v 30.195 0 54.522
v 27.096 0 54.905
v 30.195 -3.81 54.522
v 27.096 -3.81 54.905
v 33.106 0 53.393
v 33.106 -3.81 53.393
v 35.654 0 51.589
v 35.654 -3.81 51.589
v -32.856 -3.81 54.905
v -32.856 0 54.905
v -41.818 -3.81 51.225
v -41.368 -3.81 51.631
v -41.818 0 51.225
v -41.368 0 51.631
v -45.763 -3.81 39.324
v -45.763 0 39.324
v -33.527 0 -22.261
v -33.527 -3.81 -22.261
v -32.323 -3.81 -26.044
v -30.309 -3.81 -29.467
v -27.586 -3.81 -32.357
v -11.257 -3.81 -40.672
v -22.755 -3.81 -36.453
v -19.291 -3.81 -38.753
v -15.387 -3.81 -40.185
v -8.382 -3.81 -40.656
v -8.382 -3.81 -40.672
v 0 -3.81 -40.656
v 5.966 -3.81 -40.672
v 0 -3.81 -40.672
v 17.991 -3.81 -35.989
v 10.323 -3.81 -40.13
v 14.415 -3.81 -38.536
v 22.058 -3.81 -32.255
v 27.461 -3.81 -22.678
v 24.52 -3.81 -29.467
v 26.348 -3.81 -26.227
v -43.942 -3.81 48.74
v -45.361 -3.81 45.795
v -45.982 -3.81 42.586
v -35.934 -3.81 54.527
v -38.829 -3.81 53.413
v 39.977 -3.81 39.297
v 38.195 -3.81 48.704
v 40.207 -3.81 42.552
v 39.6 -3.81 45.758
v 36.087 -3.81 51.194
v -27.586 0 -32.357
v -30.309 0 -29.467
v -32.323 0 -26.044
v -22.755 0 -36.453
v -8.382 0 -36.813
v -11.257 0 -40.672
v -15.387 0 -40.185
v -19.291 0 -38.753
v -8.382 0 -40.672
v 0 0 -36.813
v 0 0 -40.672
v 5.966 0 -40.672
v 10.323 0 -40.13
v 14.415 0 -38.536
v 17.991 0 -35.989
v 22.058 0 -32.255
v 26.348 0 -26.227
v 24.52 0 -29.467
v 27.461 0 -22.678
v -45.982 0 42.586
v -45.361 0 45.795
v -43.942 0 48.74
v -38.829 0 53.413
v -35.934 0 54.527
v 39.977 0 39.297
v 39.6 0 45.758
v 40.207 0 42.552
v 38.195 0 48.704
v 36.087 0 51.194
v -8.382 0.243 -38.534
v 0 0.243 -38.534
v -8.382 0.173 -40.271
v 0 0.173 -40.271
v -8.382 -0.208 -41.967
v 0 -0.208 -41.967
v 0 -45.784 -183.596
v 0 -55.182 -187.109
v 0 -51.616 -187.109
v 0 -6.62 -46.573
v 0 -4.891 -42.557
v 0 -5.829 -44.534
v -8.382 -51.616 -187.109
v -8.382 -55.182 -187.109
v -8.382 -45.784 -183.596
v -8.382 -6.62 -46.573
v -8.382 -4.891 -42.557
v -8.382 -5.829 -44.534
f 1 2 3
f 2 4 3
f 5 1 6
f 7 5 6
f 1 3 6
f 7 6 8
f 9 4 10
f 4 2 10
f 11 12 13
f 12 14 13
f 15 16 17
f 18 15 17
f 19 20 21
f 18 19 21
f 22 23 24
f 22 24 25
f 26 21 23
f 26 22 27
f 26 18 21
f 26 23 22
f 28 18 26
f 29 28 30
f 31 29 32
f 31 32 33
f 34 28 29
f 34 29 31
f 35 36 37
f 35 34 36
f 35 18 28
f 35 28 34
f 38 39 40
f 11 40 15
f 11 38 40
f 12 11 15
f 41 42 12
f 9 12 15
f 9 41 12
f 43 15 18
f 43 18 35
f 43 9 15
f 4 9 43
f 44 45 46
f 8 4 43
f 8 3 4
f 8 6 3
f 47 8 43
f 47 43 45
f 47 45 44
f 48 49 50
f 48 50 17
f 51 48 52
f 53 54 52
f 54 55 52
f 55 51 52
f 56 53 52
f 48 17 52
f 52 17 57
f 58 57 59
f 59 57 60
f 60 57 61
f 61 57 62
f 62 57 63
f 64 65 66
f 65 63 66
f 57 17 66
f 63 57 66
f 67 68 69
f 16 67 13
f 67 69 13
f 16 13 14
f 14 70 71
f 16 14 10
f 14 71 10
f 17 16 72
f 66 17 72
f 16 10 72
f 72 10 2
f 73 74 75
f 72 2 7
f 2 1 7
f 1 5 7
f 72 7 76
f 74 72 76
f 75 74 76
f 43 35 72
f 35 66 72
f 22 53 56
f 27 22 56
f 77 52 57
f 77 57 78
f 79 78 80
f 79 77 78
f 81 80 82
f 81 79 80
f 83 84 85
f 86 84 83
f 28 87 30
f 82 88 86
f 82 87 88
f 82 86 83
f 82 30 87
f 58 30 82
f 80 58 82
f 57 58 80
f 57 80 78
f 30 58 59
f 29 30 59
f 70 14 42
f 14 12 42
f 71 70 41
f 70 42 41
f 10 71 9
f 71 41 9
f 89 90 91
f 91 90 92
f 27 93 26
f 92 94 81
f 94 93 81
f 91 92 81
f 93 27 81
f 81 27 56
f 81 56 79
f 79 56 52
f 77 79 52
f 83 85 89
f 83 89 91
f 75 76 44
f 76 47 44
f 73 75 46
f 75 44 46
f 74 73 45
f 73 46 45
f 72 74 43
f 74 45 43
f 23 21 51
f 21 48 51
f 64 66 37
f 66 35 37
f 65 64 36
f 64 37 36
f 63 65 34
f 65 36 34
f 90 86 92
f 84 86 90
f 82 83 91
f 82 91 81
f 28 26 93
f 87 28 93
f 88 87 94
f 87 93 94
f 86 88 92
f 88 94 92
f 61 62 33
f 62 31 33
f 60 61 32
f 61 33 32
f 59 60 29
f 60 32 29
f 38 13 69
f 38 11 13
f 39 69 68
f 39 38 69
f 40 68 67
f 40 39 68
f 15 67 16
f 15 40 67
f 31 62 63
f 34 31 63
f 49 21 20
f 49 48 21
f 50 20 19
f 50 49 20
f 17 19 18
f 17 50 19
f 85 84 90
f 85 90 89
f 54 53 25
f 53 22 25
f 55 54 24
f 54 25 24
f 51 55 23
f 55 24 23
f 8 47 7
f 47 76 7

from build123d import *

# Parameters (mm, degrees)
F1_DEPTH     = 3.556
F2_R         = 12.7
F5_R         = 13.0437301263
F6_DEPTH     = 3.81
F7_R         = 12.7
F8_R         = 17.78
F10_DEPTH    = 8.382
F11_T1_DEPTH = 46.8316092758
F12_T1_DEPTH = 33.4229165443


# Not quite as in the source:
# - a fillet or chamfer that OpenCascade refuses, or shapes differently, is made with other operations: its cross-section is extruded or revolved along the edge and cut away or added
# - two fillets or chamfers of one size are made in one step


with BuildPart() as f1:
    # F0 (on Front) → F1 (new body)
    with BuildSketch(Plane.XZ):
        Polygon((-47.1675397517, 46.3941131987), (-32.3176106954, -28.3448967427), (26.3168609286, -28.3448967427), (41.4012483693, 46.3471460432), (32.0179715002, 54.9054236268), (-37.7416395402, 54.9054236268), align=None)
    extrude(amount=F1_DEPTH)

    # F2
    f2_edges = [f1.edges().sort_by_distance(p)[0] for p in [
        (-47.16754, -1.778, 46.394113),
        (41.401248, -1.778, 46.347146),
        (32.017972, -1.778, 54.905424),
        (-37.74164, -1.778, 54.905424),
    ]]
    fillet(f2_edges, radius=F2_R)

    # F5
    f5_edges = [f1.edges().sort_by_distance(p)[0] for p in [
        (26.316861, -1.778, -28.344897),
    ]]
    fillet(f5_edges, radius=F5_R)

    # F0 (on Front) → F6 (join)
    with BuildSketch(Plane.XZ):
        Polygon((26.3168609286, -28.3448967427), (-32.3176106954, -28.3448967427), (-17.7800003439, -40.6717509031), (12.8904990852, -40.6717509031), align=None)
        Polygon((-47.1675397517, 46.3941131987), (-32.3176106954, -28.3448967427), (26.3168609286, -28.3448967427), (41.4012483693, 46.3471460432), (32.0179715002, 54.9054236268), (-37.7416395402, 54.9054236268), align=None)
    extrude(amount=F6_DEPTH)

    # F7
    f7_edges = [f1.edges().sort_by_distance(p)[0] for p in [
        (32.017972, -1.905, 54.905424),
        (41.401248, -1.905, 46.347146),
        (-37.74164, -1.905, 54.905424),
        (-47.16754, -1.905, 46.394113),
    ]]
    fillet(f7_edges, radius=F7_R)

    # F8
    f8_edges = [f1.edges().sort_by_distance(p)[0] for p in [
        (-17.78, -1.905, -40.671751),
        (12.890499, -1.905, -40.671751),
        (26.316861, -1.905, -28.344897),
        (-32.317611, -1.905, -28.344897),
    ]]
    fillet(f8_edges, radius=F8_R)

    # F9 (on Right) → F10 (join)
    with BuildSketch(Plane.YZ):
        Polygon((-55.1818351742, -187.108784914), (-51.6164600849, -187.108784914), (-45.784432441, -183.5964620113), (2.1481101867, -34.6464961767), (-4.9838987179, -41.8398082256), align=None)
    extrude(amount=-F10_DEPTH)

    # F11: fillet of radius 9.6308354503 on 1 edges, made by hand

    # F11_s2 → F11_t1 (cut)
    with BuildSketch(Plane.YZ.offset(-27.6068046379)):
        with BuildLine():
            ThreePointArc((0, -36.813070433), (0.2476438249, -39.4040498919), (-0.2075604578, -41.9667225361))
            Line((-0.2075604578, -41.9667225361), (2.1481101867, -34.6464961767))
            Line((2.1481101867, -34.6464961767), (0, -36.813070433))
        make_face()
    extrude(amount=F11_T1_DEPTH, mode=Mode.SUBTRACT)

    # F12: fillet of radius 29.6825671573 on 1 edges, made by hand

    # F12_s2 → F12_t1 (cut)
    with BuildSketch(Plane.YZ.offset(-20.9024582721)):
        with BuildLine():
            ThreePointArc((-3.81, -40.6558192676), (-5.3785338271, -43.5368424871), (-6.6195826892, -46.5733521413))
            Line((-6.6195826892, -46.5733521413), (-4.9838987179, -41.8398082256))
            Line((-4.9838987179, -41.8398082256), (-3.81, -40.6558192676))
        make_face()
    extrude(amount=F12_T1_DEPTH, mode=Mode.SUBTRACT)


solid = f1.part
